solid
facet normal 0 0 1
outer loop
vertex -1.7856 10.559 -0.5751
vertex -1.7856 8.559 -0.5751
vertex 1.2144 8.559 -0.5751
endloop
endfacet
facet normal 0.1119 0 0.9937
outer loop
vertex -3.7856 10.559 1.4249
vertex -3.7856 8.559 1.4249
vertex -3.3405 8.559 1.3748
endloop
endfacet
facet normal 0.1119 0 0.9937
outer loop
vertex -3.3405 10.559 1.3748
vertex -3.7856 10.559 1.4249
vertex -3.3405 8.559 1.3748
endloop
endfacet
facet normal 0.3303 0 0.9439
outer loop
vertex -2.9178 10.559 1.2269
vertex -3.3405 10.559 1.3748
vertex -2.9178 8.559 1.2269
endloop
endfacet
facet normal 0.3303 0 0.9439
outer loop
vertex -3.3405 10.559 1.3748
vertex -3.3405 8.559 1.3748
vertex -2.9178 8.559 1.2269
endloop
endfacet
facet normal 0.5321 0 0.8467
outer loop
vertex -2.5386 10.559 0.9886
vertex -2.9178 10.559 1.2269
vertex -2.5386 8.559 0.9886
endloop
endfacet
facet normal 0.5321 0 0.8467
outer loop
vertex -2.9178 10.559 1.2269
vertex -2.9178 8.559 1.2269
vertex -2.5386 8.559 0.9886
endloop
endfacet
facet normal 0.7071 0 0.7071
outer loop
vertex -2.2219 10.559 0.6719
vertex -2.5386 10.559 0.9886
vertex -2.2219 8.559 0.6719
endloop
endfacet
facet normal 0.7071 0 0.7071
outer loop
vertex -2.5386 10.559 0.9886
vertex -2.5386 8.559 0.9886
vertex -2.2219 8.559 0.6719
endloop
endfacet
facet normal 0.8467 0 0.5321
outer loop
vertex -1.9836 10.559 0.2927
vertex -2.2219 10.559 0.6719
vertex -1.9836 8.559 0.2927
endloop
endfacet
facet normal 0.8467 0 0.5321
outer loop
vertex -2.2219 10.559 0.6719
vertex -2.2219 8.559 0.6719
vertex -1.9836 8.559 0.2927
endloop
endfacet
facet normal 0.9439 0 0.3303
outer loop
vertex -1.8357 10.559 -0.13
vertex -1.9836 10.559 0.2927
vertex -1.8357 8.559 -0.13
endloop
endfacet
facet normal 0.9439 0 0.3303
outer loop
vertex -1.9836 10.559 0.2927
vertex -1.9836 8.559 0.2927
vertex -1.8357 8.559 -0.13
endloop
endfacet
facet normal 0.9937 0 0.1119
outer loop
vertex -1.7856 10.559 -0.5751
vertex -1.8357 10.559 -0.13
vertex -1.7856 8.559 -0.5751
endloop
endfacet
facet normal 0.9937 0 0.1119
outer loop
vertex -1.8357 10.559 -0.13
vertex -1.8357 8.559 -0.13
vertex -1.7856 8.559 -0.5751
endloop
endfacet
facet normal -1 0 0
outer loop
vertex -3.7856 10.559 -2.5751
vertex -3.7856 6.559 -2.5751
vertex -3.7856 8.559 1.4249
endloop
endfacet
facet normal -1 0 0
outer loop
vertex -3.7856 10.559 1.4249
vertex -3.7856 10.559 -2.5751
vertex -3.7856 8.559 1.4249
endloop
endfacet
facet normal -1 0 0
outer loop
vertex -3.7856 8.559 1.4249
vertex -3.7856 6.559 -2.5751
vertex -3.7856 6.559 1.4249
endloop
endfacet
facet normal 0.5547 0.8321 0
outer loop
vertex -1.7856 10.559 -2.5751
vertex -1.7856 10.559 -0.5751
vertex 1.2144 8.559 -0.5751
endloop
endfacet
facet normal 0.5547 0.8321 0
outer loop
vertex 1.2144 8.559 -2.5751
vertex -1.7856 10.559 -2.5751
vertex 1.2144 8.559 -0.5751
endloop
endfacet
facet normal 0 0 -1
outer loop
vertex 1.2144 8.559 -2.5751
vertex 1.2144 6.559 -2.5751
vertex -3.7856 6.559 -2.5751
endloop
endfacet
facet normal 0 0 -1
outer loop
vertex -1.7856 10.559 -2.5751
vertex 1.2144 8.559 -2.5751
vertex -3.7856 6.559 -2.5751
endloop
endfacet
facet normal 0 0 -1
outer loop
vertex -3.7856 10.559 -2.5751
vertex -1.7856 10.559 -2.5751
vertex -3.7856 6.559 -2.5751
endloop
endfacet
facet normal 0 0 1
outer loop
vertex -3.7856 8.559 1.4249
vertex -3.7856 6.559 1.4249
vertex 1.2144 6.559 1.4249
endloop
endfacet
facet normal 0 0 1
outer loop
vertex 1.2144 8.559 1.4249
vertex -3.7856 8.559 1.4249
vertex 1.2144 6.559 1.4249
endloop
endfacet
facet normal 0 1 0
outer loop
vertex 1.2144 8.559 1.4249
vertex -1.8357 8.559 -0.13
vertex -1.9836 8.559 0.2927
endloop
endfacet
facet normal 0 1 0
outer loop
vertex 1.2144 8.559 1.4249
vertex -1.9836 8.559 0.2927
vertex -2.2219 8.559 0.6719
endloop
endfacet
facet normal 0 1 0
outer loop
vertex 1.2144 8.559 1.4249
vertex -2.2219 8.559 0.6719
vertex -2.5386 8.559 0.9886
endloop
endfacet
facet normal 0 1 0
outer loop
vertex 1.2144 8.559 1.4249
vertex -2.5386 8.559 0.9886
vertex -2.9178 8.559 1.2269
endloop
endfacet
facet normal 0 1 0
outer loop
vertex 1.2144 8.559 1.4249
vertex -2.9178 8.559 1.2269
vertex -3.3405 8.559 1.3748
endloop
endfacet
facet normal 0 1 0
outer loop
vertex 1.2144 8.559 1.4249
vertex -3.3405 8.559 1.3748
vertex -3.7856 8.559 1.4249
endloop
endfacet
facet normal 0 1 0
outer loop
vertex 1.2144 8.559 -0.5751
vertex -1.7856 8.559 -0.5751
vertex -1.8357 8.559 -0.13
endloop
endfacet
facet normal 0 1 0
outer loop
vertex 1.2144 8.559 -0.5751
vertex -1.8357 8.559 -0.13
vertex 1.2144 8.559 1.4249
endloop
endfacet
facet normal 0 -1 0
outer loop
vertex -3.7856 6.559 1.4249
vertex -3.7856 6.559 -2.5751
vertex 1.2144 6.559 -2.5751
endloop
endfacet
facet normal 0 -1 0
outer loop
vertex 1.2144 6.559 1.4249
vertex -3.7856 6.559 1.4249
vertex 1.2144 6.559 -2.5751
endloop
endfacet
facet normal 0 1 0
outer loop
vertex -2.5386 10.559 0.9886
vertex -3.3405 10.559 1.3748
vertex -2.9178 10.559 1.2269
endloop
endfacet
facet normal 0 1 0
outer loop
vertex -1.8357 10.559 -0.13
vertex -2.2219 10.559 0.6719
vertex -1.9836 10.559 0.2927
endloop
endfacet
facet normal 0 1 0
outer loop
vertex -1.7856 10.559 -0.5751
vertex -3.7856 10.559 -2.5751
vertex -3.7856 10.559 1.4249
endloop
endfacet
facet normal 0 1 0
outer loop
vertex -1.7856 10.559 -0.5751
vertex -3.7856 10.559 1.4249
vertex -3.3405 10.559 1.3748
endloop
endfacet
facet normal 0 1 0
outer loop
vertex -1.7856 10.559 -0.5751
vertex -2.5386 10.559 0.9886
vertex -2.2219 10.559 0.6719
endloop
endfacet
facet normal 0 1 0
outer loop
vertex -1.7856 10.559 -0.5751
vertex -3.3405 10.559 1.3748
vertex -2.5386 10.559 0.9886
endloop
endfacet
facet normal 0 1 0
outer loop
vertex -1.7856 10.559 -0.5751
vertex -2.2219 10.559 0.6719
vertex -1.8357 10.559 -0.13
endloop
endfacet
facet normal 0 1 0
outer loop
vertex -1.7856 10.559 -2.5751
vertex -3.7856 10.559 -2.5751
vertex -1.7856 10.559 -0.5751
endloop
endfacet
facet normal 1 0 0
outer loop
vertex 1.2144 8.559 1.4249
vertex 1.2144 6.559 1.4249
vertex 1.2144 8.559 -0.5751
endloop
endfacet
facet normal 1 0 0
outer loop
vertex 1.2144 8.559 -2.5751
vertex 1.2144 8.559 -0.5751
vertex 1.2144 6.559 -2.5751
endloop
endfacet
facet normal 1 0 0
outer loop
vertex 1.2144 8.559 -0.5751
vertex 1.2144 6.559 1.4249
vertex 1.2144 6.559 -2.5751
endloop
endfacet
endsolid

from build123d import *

# Parameters (mm, degrees)
SKETCH_1_W          = 25
SKETCH_1_H          = 20
EXTRUDE_1_DEPTH     = 10
EXTRUDE_2_DEPTH     = 20
CUT_EXTRUDE_1_DEPTH = 20
SCALE_1_SCALE       = 0.2


with BuildPart() as part:
    # 草圖1 → 填料-伸長1 (new body)
    with BuildSketch(Plane(origin=(0, 0, 0), x_dir=(1, 0, 0), z_dir=(0, 1, 0))):
        Rectangle(SKETCH_1_W, SKETCH_1_H)
    extrude(amount=EXTRUDE_1_DEPTH)

    # 草圖1<3> → 填料-伸長2 (add)
    with BuildSketch(Plane(origin=(0, 0, 0), x_dir=(1, 0, 0), z_dir=(0, 1, 0))):
        with BuildLine():
            Line((-12.5, 10), (-12.5, -10))
            ThreePointArc((-12.5, -10), (-5.428932188, -7.071067812), (-2.5, 0))
            Line((-2.5, 0), (12.5, 0))
            Line((12.5, 0), (12.5, 10))
            Line((12.5, 10), (-12.5, 10))
        make_face()
    extrude(amount=EXTRUDE_2_DEPTH)

    # 草圖2 → 除料-伸長1 (cut)
    with BuildSketch(Plane.XY):
        Polygon((-2.5, 20), (12.5, 10), (12.5, 20), align=None)
    extrude(amount=-CUT_EXTRUDE_1_DEPTH, mode=Mode.SUBTRACT)


with BuildPart() as part_1:
    # 縮放比例1: scaled about (-1.606967999, 8.198766822, -0.718829523)
    add(part.part.scale(SCALE_1_SCALE).moved(Location((-1.285574399, 6.559013458, -0.575063618))))


solid = part_1.part
